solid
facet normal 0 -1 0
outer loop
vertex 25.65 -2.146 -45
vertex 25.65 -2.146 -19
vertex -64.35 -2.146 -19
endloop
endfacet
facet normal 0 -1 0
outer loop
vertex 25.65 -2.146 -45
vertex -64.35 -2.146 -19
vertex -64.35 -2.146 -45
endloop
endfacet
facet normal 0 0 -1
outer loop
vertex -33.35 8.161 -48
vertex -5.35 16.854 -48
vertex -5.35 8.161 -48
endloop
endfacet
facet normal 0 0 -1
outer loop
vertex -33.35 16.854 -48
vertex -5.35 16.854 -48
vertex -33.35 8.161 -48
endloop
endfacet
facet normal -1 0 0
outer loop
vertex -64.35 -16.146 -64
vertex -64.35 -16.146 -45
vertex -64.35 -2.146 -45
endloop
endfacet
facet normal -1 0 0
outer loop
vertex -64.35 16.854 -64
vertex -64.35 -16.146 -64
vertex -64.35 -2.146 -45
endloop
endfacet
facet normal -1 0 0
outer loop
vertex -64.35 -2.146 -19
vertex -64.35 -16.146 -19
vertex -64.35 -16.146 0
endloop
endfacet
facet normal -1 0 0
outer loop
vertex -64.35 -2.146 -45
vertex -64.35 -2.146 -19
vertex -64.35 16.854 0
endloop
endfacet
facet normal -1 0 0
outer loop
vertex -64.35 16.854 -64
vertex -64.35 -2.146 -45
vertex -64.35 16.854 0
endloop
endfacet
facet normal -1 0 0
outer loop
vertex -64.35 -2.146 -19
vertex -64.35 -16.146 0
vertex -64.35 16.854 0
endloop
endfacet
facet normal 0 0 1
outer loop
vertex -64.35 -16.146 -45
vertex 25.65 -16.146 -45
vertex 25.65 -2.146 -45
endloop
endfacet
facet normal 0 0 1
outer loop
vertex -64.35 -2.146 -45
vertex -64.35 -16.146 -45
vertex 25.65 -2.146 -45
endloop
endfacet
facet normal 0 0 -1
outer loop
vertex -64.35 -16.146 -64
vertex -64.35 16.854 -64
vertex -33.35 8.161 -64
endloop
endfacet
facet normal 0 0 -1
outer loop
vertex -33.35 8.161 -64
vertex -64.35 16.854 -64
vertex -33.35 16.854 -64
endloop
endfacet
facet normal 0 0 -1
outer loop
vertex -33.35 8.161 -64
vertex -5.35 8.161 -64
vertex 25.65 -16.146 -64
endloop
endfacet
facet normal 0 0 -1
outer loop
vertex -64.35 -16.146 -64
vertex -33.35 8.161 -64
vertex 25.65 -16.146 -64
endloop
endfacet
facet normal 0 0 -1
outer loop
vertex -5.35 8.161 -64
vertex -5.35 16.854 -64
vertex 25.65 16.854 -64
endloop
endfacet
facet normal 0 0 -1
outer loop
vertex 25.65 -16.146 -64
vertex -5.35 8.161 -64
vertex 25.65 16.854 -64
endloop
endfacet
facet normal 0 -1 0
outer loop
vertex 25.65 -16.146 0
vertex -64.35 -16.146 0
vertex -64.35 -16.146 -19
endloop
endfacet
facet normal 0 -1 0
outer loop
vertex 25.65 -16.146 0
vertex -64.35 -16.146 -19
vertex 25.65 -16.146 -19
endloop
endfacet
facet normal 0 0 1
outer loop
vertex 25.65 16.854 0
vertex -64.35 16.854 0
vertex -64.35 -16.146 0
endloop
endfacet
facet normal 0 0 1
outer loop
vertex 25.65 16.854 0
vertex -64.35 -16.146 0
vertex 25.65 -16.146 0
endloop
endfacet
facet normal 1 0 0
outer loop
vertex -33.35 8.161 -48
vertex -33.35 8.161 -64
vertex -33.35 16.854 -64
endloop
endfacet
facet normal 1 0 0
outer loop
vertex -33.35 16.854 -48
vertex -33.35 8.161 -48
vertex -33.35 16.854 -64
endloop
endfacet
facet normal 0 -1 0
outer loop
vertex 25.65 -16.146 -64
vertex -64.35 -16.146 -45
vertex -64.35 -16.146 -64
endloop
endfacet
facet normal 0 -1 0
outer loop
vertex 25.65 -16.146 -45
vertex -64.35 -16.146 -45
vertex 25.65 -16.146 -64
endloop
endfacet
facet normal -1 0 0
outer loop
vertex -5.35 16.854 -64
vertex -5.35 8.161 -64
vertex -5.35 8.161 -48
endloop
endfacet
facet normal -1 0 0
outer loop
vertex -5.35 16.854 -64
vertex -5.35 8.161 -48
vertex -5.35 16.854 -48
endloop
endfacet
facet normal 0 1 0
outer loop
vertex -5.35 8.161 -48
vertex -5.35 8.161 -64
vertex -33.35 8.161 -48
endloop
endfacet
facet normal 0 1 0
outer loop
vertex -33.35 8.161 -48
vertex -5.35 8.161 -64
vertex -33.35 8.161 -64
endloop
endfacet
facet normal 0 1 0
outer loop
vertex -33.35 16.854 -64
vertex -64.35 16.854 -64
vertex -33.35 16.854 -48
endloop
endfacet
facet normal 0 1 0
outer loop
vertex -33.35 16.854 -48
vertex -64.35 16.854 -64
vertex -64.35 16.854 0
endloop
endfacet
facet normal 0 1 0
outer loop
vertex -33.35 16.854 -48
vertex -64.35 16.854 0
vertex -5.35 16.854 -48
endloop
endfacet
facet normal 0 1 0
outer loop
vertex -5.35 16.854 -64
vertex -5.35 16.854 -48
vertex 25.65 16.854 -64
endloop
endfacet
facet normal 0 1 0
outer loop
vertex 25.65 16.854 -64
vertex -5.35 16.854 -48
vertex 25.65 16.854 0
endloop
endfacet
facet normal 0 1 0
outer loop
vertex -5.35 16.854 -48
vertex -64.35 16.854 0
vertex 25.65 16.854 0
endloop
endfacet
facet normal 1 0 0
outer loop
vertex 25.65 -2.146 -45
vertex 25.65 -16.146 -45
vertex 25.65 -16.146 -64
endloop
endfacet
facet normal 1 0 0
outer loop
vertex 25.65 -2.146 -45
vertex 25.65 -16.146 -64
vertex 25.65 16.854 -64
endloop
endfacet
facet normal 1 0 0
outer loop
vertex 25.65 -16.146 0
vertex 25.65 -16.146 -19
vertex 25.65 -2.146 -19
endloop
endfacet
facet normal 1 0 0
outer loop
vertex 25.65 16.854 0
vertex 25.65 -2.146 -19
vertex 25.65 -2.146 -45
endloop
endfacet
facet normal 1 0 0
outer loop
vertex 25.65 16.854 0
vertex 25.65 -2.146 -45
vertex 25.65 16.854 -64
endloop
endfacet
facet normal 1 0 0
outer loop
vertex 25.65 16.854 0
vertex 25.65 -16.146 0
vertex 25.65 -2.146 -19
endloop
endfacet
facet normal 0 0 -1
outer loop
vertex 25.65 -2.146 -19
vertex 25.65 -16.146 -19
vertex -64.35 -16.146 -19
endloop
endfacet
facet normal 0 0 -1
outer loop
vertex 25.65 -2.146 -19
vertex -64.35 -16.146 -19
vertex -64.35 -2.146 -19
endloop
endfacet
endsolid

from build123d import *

# Parameters (mm, degrees)
SKETCH1_W           = 90
SKETCH1_H           = 33
BOSS_EXTRUDE1_DEPTH = 64
CUT_EXTRUDE3_REACH  = 113.714
SKETCH2_W           = 26
SKETCH2_H           = 14
SKETCH3_W           = 28
SKETCH3_H           = 8.692638167
CUT_EXTRUDE4_DEPTH  = 16


with BuildPart() as part:
    # Sketch1 → Boss-Extrude1 (new body)
    with BuildSketch(Plane.XY):
        with Locations((-19.35, 0.353571429)):
            Rectangle(SKETCH1_W, SKETCH1_H)
    extrude(amount=-BOSS_EXTRUDE1_DEPTH)

    # Sketch2 → Cut-Extrude3 (cut, up to next)
    with BuildSketch(Plane(origin=(25.65, 0, 0), x_dir=(0, 0, -1), z_dir=(1, 0, 0)), mode=Mode.PRIVATE) as cut_extrude3_sk1:
        with Locations((32, -9.146428571)):
            Rectangle(SKETCH2_W, SKETCH2_H)
    cut_extrude3_tool1 = extrude(cut_extrude3_sk1.sketch, amount=-CUT_EXTRUDE3_REACH, mode=Mode.PRIVATE) & part.part
    add(cut_extrude3_tool1.solids().sort_by_distance((25.65, -9.146429, -32))[0], mode=Mode.SUBTRACT)

    # Sketch3 → Cut-Extrude4 (cut)
    with BuildSketch(Plane(origin=(0, 0, -64), x_dir=(-1, 0, 0), z_dir=(0, 0, -1))):
        with Locations((19.35, 12.507252346)):
            Rectangle(SKETCH3_W, SKETCH3_H)
    extrude(amount=-CUT_EXTRUDE4_DEPTH, mode=Mode.SUBTRACT)


solid = part.part
